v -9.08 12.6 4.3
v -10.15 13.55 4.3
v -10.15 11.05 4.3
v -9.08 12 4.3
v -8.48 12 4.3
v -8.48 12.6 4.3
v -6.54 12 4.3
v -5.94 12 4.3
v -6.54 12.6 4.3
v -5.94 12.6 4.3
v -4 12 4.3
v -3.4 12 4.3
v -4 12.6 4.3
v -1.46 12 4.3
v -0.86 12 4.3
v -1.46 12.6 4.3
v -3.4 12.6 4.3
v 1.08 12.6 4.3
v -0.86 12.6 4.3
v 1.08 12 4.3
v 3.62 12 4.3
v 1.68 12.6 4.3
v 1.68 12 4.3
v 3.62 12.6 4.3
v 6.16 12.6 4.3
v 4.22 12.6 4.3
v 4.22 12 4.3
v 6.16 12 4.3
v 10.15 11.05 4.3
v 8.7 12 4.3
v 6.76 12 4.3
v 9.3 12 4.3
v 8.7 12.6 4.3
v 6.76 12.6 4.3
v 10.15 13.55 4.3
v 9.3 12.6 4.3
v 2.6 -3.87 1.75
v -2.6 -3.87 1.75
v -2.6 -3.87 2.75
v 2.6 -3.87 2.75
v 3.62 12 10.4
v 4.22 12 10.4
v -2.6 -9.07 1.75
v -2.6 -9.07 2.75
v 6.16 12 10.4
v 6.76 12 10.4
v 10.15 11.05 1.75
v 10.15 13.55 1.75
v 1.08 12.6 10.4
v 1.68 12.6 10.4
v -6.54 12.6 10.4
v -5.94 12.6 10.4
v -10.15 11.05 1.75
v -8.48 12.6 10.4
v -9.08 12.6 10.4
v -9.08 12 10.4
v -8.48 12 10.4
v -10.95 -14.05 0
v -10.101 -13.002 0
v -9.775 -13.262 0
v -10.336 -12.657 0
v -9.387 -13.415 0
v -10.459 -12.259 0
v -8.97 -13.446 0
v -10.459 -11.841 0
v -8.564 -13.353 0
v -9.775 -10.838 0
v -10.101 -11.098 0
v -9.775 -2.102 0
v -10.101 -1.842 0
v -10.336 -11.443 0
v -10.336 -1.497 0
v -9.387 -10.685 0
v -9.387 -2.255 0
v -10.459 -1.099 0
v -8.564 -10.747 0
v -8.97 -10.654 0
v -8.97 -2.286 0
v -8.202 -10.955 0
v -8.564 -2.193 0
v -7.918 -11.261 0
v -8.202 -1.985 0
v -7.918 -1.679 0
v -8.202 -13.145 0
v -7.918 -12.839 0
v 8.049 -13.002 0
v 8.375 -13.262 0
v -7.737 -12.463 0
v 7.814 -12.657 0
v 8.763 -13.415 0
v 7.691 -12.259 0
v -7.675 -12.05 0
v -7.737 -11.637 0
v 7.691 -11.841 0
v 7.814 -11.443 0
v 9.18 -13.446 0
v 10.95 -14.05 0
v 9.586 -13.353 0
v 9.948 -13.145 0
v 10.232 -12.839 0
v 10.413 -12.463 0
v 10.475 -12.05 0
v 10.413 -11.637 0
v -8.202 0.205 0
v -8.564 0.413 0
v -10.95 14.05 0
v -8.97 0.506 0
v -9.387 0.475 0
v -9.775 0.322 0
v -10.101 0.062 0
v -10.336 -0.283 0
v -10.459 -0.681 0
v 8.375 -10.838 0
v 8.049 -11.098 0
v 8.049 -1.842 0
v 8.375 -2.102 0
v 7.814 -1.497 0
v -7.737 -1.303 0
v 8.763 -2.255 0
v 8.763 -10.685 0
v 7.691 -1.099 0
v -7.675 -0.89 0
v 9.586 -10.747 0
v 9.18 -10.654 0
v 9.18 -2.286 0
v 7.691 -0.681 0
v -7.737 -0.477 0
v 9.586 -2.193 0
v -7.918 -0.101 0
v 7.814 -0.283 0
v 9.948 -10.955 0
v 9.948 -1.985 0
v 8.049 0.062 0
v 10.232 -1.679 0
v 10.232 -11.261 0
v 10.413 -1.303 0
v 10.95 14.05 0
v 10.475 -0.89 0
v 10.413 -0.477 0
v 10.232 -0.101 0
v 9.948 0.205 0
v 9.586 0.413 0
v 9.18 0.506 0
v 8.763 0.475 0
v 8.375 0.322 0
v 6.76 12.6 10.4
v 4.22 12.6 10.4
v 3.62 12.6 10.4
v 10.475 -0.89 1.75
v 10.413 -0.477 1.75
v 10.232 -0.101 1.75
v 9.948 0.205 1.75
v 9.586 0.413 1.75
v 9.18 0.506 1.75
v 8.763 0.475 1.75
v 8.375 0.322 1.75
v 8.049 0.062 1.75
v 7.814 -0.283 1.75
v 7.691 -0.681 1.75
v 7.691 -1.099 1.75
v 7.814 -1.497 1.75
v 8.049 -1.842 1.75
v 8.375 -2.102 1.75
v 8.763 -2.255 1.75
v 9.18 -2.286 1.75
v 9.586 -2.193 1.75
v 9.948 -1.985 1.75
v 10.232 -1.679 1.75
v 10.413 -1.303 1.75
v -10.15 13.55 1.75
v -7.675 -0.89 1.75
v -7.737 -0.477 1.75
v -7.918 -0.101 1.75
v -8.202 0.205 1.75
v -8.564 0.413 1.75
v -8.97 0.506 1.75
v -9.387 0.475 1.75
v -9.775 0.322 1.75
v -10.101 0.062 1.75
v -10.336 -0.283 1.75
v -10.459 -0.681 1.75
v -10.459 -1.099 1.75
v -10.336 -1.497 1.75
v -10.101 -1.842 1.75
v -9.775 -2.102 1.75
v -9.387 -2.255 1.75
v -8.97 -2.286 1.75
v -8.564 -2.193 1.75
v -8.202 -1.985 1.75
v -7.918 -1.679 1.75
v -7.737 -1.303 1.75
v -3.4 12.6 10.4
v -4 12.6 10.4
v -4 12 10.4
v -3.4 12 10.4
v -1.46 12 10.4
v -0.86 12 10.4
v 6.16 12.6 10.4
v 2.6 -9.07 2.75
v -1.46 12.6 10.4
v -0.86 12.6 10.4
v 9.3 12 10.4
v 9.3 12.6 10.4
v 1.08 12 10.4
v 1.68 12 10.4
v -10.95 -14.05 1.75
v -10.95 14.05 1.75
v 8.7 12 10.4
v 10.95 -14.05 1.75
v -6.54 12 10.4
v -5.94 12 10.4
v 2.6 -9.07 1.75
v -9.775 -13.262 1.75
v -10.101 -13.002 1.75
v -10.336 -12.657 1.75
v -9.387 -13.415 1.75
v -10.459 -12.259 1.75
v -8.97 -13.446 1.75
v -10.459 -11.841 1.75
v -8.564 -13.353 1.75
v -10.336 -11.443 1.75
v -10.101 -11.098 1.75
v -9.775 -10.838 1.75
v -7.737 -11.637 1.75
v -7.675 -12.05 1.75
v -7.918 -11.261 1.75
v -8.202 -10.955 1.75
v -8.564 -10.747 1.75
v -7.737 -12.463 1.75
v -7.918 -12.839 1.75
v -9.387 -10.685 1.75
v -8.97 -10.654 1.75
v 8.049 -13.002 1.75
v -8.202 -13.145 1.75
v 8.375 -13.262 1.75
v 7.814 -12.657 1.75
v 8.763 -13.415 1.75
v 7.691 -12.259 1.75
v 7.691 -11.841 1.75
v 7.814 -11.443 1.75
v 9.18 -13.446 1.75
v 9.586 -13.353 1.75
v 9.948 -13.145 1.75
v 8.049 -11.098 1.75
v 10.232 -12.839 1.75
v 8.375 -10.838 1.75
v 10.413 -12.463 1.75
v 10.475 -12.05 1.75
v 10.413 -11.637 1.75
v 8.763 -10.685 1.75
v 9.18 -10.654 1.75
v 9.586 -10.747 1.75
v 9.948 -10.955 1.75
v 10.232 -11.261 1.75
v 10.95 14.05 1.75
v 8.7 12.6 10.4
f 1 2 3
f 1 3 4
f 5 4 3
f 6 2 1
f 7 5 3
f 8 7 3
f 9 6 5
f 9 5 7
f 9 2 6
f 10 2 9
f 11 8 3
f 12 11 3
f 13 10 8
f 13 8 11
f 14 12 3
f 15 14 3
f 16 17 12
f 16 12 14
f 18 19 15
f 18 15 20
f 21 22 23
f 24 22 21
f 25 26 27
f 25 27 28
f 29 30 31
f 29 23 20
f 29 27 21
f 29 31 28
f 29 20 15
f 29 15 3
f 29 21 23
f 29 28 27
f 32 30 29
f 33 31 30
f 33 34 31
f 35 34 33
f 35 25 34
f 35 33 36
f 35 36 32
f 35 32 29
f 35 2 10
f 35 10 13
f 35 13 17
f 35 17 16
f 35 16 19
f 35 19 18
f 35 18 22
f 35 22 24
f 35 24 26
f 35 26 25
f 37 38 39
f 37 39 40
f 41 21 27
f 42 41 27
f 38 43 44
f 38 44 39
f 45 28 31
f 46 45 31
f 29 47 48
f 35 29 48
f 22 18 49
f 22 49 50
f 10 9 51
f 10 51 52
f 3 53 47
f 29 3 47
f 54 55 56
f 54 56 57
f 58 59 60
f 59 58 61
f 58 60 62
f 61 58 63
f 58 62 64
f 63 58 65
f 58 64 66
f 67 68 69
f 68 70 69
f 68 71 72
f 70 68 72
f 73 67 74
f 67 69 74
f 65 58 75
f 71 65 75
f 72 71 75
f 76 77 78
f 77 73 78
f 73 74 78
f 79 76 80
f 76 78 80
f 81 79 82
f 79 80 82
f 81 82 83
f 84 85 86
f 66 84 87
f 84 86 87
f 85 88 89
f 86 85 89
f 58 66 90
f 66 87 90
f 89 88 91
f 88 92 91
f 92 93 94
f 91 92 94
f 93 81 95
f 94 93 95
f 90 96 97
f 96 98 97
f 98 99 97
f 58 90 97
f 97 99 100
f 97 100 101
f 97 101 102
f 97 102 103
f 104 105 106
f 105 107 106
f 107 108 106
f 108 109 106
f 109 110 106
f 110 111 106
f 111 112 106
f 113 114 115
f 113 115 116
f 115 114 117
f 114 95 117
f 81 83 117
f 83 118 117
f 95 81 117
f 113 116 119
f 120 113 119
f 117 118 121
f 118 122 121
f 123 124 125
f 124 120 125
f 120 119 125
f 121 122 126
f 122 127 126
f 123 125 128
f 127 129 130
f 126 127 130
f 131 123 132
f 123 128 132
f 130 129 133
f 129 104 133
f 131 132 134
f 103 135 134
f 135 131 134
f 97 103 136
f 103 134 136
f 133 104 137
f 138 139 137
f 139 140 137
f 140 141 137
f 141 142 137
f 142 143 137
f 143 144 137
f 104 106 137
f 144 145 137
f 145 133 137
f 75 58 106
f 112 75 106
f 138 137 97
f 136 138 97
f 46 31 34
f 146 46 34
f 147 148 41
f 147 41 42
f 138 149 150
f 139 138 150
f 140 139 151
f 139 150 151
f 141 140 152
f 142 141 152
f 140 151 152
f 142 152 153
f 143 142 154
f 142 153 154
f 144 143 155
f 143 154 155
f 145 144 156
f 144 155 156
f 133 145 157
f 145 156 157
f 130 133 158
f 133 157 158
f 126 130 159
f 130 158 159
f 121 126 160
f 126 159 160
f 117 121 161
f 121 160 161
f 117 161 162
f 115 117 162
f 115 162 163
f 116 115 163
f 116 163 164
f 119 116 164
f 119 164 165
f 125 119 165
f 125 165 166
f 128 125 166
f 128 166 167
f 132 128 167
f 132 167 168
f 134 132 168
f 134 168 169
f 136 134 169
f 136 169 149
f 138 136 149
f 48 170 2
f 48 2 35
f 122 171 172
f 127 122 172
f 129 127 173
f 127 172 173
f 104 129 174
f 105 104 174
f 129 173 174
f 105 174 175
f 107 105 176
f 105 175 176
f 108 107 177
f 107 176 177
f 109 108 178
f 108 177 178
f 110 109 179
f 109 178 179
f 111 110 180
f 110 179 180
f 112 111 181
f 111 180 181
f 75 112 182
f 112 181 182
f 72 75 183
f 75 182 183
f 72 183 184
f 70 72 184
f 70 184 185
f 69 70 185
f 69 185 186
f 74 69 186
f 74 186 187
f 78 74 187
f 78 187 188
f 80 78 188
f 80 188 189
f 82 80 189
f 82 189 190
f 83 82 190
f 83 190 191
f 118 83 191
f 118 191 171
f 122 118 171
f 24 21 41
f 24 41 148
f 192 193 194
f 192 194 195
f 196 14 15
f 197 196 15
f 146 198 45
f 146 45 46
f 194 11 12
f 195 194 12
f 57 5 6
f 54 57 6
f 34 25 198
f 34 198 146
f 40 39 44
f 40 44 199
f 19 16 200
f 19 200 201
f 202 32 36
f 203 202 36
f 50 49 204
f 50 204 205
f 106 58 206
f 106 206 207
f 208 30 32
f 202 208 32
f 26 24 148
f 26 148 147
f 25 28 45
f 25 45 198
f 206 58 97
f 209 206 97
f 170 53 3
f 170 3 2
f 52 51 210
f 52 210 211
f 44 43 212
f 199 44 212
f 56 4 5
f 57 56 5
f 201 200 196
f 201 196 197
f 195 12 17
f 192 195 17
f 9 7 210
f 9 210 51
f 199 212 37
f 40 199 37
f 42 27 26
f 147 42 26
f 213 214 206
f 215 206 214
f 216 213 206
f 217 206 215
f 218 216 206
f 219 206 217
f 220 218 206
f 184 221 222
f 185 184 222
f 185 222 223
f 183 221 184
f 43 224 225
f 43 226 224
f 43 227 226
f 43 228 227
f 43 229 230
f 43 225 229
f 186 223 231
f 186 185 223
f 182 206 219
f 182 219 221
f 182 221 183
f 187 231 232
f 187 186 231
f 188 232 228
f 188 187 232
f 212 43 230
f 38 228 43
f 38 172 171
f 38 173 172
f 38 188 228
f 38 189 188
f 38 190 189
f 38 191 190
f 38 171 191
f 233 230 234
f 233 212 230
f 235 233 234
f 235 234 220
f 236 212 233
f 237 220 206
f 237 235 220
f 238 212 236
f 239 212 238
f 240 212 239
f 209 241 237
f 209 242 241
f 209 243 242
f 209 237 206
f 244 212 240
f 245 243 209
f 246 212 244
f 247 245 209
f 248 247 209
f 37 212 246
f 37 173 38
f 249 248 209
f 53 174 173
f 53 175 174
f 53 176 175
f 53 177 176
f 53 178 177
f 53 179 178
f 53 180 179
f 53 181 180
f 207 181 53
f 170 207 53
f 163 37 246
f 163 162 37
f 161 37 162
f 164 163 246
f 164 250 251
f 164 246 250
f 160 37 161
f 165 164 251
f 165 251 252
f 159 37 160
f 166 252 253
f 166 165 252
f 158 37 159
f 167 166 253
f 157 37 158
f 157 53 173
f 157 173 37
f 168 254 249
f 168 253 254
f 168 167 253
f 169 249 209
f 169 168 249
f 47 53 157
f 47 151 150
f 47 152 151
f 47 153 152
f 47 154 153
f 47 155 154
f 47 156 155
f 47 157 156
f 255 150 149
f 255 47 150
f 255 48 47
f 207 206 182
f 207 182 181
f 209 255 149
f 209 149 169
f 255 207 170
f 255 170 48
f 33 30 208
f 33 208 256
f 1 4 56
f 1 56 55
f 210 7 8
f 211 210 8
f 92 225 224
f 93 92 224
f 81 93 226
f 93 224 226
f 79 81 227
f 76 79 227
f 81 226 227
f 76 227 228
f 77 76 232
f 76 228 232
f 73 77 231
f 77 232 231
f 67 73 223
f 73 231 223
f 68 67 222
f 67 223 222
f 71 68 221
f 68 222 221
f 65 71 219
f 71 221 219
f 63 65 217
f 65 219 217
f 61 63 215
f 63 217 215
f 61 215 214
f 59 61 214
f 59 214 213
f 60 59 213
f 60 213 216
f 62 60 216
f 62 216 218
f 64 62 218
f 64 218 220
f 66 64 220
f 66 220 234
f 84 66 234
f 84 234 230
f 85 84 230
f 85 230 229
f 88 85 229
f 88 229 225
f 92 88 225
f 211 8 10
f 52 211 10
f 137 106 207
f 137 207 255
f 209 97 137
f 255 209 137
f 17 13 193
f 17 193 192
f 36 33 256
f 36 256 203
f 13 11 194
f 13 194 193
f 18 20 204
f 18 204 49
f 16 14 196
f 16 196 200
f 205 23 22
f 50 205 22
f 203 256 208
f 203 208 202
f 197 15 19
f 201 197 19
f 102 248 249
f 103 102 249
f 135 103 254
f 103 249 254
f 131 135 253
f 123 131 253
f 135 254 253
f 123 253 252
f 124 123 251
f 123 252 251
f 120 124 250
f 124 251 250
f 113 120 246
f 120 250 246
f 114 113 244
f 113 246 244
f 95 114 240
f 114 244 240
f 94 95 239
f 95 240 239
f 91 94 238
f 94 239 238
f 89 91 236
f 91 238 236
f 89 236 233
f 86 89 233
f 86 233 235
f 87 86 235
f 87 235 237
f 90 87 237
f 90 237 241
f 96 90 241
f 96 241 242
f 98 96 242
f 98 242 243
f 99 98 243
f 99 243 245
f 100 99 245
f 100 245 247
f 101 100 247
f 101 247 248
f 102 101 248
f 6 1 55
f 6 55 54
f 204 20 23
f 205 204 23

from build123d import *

# Parameters (mm, degrees)
SKETCH1_W           = 21.9
SKETCH1_H           = 28.1
BOSS_EXTRUDE1_DEPTH = 1.75
SKETCH2_R           = 1.4
CUT_EXTRUDE1_DEPTH  = 18.89881281
SKETCH3_W           = 5.2
SKETCH3_H           = 5.2
BOSS_EXTRUDE2_DEPTH = 1
SKETCH4_W           = 20.3
SKETCH4_H           = 2.5
BOSS_EXTRUDE3_DEPTH = 2.55
SKETCH5_W           = 0.6
SKETCH5_H           = 0.6
BOSS_EXTRUDE4_DEPTH = 6.1
LPATTERN1_COUNT     = 8
LPATTERN1_PITCH     = 2.54


with BuildPart() as part:
    # Sketch1 → Boss-Extrude1 (new body)
    with BuildSketch(Plane.XY):
        Rectangle(SKETCH1_W, SKETCH1_H)
    extrude(amount=BOSS_EXTRUDE1_DEPTH)

    # Sketch2 → Cut-Extrude1 (cut, through all)
    with BuildSketch(Plane.XY.offset(1.75)):
        with Locations((-9.075, -0.89)):
            Circle(SKETCH2_R)
        with Locations((9.075, -0.89)):
            Circle(SKETCH2_R)
        with Locations((9.075, -12.05)):
            Circle(SKETCH2_R)
        with Locations((-9.075, -12.05)):
            Circle(SKETCH2_R)
    extrude(amount=-CUT_EXTRUDE1_DEPTH, mode=Mode.SUBTRACT)

    # Sketch3 → Boss-Extrude2 (add)
    with BuildSketch(Plane.XY.offset(1.75)):
        with Locations((0, -6.47)):
            Rectangle(SKETCH3_W, SKETCH3_H)
    extrude(amount=BOSS_EXTRUDE2_DEPTH)

    # Sketch4 → Boss-Extrude3 (add)
    with BuildSketch(Plane.XY.offset(1.75)):
        with Locations((0, 12.3)):
            Rectangle(SKETCH4_W, SKETCH4_H)
    extrude(amount=BOSS_EXTRUDE3_DEPTH)

    # Sketch5 → Boss-Extrude4 (add)
    with BuildSketch(Plane.XY.offset(4.3)):
        with Locations((-8.78, 12.3)):
            Rectangle(SKETCH5_W, SKETCH5_H)
    boss_extrude4 = extrude(amount=BOSS_EXTRUDE4_DEPTH)

    # LPattern1: Boss-Extrude4 ×8
    with Locations(*[(i * LPATTERN1_PITCH, 0, 0) for i in range(1, LPATTERN1_COUNT)]):
        add(boss_extrude4)


solid = part.part
